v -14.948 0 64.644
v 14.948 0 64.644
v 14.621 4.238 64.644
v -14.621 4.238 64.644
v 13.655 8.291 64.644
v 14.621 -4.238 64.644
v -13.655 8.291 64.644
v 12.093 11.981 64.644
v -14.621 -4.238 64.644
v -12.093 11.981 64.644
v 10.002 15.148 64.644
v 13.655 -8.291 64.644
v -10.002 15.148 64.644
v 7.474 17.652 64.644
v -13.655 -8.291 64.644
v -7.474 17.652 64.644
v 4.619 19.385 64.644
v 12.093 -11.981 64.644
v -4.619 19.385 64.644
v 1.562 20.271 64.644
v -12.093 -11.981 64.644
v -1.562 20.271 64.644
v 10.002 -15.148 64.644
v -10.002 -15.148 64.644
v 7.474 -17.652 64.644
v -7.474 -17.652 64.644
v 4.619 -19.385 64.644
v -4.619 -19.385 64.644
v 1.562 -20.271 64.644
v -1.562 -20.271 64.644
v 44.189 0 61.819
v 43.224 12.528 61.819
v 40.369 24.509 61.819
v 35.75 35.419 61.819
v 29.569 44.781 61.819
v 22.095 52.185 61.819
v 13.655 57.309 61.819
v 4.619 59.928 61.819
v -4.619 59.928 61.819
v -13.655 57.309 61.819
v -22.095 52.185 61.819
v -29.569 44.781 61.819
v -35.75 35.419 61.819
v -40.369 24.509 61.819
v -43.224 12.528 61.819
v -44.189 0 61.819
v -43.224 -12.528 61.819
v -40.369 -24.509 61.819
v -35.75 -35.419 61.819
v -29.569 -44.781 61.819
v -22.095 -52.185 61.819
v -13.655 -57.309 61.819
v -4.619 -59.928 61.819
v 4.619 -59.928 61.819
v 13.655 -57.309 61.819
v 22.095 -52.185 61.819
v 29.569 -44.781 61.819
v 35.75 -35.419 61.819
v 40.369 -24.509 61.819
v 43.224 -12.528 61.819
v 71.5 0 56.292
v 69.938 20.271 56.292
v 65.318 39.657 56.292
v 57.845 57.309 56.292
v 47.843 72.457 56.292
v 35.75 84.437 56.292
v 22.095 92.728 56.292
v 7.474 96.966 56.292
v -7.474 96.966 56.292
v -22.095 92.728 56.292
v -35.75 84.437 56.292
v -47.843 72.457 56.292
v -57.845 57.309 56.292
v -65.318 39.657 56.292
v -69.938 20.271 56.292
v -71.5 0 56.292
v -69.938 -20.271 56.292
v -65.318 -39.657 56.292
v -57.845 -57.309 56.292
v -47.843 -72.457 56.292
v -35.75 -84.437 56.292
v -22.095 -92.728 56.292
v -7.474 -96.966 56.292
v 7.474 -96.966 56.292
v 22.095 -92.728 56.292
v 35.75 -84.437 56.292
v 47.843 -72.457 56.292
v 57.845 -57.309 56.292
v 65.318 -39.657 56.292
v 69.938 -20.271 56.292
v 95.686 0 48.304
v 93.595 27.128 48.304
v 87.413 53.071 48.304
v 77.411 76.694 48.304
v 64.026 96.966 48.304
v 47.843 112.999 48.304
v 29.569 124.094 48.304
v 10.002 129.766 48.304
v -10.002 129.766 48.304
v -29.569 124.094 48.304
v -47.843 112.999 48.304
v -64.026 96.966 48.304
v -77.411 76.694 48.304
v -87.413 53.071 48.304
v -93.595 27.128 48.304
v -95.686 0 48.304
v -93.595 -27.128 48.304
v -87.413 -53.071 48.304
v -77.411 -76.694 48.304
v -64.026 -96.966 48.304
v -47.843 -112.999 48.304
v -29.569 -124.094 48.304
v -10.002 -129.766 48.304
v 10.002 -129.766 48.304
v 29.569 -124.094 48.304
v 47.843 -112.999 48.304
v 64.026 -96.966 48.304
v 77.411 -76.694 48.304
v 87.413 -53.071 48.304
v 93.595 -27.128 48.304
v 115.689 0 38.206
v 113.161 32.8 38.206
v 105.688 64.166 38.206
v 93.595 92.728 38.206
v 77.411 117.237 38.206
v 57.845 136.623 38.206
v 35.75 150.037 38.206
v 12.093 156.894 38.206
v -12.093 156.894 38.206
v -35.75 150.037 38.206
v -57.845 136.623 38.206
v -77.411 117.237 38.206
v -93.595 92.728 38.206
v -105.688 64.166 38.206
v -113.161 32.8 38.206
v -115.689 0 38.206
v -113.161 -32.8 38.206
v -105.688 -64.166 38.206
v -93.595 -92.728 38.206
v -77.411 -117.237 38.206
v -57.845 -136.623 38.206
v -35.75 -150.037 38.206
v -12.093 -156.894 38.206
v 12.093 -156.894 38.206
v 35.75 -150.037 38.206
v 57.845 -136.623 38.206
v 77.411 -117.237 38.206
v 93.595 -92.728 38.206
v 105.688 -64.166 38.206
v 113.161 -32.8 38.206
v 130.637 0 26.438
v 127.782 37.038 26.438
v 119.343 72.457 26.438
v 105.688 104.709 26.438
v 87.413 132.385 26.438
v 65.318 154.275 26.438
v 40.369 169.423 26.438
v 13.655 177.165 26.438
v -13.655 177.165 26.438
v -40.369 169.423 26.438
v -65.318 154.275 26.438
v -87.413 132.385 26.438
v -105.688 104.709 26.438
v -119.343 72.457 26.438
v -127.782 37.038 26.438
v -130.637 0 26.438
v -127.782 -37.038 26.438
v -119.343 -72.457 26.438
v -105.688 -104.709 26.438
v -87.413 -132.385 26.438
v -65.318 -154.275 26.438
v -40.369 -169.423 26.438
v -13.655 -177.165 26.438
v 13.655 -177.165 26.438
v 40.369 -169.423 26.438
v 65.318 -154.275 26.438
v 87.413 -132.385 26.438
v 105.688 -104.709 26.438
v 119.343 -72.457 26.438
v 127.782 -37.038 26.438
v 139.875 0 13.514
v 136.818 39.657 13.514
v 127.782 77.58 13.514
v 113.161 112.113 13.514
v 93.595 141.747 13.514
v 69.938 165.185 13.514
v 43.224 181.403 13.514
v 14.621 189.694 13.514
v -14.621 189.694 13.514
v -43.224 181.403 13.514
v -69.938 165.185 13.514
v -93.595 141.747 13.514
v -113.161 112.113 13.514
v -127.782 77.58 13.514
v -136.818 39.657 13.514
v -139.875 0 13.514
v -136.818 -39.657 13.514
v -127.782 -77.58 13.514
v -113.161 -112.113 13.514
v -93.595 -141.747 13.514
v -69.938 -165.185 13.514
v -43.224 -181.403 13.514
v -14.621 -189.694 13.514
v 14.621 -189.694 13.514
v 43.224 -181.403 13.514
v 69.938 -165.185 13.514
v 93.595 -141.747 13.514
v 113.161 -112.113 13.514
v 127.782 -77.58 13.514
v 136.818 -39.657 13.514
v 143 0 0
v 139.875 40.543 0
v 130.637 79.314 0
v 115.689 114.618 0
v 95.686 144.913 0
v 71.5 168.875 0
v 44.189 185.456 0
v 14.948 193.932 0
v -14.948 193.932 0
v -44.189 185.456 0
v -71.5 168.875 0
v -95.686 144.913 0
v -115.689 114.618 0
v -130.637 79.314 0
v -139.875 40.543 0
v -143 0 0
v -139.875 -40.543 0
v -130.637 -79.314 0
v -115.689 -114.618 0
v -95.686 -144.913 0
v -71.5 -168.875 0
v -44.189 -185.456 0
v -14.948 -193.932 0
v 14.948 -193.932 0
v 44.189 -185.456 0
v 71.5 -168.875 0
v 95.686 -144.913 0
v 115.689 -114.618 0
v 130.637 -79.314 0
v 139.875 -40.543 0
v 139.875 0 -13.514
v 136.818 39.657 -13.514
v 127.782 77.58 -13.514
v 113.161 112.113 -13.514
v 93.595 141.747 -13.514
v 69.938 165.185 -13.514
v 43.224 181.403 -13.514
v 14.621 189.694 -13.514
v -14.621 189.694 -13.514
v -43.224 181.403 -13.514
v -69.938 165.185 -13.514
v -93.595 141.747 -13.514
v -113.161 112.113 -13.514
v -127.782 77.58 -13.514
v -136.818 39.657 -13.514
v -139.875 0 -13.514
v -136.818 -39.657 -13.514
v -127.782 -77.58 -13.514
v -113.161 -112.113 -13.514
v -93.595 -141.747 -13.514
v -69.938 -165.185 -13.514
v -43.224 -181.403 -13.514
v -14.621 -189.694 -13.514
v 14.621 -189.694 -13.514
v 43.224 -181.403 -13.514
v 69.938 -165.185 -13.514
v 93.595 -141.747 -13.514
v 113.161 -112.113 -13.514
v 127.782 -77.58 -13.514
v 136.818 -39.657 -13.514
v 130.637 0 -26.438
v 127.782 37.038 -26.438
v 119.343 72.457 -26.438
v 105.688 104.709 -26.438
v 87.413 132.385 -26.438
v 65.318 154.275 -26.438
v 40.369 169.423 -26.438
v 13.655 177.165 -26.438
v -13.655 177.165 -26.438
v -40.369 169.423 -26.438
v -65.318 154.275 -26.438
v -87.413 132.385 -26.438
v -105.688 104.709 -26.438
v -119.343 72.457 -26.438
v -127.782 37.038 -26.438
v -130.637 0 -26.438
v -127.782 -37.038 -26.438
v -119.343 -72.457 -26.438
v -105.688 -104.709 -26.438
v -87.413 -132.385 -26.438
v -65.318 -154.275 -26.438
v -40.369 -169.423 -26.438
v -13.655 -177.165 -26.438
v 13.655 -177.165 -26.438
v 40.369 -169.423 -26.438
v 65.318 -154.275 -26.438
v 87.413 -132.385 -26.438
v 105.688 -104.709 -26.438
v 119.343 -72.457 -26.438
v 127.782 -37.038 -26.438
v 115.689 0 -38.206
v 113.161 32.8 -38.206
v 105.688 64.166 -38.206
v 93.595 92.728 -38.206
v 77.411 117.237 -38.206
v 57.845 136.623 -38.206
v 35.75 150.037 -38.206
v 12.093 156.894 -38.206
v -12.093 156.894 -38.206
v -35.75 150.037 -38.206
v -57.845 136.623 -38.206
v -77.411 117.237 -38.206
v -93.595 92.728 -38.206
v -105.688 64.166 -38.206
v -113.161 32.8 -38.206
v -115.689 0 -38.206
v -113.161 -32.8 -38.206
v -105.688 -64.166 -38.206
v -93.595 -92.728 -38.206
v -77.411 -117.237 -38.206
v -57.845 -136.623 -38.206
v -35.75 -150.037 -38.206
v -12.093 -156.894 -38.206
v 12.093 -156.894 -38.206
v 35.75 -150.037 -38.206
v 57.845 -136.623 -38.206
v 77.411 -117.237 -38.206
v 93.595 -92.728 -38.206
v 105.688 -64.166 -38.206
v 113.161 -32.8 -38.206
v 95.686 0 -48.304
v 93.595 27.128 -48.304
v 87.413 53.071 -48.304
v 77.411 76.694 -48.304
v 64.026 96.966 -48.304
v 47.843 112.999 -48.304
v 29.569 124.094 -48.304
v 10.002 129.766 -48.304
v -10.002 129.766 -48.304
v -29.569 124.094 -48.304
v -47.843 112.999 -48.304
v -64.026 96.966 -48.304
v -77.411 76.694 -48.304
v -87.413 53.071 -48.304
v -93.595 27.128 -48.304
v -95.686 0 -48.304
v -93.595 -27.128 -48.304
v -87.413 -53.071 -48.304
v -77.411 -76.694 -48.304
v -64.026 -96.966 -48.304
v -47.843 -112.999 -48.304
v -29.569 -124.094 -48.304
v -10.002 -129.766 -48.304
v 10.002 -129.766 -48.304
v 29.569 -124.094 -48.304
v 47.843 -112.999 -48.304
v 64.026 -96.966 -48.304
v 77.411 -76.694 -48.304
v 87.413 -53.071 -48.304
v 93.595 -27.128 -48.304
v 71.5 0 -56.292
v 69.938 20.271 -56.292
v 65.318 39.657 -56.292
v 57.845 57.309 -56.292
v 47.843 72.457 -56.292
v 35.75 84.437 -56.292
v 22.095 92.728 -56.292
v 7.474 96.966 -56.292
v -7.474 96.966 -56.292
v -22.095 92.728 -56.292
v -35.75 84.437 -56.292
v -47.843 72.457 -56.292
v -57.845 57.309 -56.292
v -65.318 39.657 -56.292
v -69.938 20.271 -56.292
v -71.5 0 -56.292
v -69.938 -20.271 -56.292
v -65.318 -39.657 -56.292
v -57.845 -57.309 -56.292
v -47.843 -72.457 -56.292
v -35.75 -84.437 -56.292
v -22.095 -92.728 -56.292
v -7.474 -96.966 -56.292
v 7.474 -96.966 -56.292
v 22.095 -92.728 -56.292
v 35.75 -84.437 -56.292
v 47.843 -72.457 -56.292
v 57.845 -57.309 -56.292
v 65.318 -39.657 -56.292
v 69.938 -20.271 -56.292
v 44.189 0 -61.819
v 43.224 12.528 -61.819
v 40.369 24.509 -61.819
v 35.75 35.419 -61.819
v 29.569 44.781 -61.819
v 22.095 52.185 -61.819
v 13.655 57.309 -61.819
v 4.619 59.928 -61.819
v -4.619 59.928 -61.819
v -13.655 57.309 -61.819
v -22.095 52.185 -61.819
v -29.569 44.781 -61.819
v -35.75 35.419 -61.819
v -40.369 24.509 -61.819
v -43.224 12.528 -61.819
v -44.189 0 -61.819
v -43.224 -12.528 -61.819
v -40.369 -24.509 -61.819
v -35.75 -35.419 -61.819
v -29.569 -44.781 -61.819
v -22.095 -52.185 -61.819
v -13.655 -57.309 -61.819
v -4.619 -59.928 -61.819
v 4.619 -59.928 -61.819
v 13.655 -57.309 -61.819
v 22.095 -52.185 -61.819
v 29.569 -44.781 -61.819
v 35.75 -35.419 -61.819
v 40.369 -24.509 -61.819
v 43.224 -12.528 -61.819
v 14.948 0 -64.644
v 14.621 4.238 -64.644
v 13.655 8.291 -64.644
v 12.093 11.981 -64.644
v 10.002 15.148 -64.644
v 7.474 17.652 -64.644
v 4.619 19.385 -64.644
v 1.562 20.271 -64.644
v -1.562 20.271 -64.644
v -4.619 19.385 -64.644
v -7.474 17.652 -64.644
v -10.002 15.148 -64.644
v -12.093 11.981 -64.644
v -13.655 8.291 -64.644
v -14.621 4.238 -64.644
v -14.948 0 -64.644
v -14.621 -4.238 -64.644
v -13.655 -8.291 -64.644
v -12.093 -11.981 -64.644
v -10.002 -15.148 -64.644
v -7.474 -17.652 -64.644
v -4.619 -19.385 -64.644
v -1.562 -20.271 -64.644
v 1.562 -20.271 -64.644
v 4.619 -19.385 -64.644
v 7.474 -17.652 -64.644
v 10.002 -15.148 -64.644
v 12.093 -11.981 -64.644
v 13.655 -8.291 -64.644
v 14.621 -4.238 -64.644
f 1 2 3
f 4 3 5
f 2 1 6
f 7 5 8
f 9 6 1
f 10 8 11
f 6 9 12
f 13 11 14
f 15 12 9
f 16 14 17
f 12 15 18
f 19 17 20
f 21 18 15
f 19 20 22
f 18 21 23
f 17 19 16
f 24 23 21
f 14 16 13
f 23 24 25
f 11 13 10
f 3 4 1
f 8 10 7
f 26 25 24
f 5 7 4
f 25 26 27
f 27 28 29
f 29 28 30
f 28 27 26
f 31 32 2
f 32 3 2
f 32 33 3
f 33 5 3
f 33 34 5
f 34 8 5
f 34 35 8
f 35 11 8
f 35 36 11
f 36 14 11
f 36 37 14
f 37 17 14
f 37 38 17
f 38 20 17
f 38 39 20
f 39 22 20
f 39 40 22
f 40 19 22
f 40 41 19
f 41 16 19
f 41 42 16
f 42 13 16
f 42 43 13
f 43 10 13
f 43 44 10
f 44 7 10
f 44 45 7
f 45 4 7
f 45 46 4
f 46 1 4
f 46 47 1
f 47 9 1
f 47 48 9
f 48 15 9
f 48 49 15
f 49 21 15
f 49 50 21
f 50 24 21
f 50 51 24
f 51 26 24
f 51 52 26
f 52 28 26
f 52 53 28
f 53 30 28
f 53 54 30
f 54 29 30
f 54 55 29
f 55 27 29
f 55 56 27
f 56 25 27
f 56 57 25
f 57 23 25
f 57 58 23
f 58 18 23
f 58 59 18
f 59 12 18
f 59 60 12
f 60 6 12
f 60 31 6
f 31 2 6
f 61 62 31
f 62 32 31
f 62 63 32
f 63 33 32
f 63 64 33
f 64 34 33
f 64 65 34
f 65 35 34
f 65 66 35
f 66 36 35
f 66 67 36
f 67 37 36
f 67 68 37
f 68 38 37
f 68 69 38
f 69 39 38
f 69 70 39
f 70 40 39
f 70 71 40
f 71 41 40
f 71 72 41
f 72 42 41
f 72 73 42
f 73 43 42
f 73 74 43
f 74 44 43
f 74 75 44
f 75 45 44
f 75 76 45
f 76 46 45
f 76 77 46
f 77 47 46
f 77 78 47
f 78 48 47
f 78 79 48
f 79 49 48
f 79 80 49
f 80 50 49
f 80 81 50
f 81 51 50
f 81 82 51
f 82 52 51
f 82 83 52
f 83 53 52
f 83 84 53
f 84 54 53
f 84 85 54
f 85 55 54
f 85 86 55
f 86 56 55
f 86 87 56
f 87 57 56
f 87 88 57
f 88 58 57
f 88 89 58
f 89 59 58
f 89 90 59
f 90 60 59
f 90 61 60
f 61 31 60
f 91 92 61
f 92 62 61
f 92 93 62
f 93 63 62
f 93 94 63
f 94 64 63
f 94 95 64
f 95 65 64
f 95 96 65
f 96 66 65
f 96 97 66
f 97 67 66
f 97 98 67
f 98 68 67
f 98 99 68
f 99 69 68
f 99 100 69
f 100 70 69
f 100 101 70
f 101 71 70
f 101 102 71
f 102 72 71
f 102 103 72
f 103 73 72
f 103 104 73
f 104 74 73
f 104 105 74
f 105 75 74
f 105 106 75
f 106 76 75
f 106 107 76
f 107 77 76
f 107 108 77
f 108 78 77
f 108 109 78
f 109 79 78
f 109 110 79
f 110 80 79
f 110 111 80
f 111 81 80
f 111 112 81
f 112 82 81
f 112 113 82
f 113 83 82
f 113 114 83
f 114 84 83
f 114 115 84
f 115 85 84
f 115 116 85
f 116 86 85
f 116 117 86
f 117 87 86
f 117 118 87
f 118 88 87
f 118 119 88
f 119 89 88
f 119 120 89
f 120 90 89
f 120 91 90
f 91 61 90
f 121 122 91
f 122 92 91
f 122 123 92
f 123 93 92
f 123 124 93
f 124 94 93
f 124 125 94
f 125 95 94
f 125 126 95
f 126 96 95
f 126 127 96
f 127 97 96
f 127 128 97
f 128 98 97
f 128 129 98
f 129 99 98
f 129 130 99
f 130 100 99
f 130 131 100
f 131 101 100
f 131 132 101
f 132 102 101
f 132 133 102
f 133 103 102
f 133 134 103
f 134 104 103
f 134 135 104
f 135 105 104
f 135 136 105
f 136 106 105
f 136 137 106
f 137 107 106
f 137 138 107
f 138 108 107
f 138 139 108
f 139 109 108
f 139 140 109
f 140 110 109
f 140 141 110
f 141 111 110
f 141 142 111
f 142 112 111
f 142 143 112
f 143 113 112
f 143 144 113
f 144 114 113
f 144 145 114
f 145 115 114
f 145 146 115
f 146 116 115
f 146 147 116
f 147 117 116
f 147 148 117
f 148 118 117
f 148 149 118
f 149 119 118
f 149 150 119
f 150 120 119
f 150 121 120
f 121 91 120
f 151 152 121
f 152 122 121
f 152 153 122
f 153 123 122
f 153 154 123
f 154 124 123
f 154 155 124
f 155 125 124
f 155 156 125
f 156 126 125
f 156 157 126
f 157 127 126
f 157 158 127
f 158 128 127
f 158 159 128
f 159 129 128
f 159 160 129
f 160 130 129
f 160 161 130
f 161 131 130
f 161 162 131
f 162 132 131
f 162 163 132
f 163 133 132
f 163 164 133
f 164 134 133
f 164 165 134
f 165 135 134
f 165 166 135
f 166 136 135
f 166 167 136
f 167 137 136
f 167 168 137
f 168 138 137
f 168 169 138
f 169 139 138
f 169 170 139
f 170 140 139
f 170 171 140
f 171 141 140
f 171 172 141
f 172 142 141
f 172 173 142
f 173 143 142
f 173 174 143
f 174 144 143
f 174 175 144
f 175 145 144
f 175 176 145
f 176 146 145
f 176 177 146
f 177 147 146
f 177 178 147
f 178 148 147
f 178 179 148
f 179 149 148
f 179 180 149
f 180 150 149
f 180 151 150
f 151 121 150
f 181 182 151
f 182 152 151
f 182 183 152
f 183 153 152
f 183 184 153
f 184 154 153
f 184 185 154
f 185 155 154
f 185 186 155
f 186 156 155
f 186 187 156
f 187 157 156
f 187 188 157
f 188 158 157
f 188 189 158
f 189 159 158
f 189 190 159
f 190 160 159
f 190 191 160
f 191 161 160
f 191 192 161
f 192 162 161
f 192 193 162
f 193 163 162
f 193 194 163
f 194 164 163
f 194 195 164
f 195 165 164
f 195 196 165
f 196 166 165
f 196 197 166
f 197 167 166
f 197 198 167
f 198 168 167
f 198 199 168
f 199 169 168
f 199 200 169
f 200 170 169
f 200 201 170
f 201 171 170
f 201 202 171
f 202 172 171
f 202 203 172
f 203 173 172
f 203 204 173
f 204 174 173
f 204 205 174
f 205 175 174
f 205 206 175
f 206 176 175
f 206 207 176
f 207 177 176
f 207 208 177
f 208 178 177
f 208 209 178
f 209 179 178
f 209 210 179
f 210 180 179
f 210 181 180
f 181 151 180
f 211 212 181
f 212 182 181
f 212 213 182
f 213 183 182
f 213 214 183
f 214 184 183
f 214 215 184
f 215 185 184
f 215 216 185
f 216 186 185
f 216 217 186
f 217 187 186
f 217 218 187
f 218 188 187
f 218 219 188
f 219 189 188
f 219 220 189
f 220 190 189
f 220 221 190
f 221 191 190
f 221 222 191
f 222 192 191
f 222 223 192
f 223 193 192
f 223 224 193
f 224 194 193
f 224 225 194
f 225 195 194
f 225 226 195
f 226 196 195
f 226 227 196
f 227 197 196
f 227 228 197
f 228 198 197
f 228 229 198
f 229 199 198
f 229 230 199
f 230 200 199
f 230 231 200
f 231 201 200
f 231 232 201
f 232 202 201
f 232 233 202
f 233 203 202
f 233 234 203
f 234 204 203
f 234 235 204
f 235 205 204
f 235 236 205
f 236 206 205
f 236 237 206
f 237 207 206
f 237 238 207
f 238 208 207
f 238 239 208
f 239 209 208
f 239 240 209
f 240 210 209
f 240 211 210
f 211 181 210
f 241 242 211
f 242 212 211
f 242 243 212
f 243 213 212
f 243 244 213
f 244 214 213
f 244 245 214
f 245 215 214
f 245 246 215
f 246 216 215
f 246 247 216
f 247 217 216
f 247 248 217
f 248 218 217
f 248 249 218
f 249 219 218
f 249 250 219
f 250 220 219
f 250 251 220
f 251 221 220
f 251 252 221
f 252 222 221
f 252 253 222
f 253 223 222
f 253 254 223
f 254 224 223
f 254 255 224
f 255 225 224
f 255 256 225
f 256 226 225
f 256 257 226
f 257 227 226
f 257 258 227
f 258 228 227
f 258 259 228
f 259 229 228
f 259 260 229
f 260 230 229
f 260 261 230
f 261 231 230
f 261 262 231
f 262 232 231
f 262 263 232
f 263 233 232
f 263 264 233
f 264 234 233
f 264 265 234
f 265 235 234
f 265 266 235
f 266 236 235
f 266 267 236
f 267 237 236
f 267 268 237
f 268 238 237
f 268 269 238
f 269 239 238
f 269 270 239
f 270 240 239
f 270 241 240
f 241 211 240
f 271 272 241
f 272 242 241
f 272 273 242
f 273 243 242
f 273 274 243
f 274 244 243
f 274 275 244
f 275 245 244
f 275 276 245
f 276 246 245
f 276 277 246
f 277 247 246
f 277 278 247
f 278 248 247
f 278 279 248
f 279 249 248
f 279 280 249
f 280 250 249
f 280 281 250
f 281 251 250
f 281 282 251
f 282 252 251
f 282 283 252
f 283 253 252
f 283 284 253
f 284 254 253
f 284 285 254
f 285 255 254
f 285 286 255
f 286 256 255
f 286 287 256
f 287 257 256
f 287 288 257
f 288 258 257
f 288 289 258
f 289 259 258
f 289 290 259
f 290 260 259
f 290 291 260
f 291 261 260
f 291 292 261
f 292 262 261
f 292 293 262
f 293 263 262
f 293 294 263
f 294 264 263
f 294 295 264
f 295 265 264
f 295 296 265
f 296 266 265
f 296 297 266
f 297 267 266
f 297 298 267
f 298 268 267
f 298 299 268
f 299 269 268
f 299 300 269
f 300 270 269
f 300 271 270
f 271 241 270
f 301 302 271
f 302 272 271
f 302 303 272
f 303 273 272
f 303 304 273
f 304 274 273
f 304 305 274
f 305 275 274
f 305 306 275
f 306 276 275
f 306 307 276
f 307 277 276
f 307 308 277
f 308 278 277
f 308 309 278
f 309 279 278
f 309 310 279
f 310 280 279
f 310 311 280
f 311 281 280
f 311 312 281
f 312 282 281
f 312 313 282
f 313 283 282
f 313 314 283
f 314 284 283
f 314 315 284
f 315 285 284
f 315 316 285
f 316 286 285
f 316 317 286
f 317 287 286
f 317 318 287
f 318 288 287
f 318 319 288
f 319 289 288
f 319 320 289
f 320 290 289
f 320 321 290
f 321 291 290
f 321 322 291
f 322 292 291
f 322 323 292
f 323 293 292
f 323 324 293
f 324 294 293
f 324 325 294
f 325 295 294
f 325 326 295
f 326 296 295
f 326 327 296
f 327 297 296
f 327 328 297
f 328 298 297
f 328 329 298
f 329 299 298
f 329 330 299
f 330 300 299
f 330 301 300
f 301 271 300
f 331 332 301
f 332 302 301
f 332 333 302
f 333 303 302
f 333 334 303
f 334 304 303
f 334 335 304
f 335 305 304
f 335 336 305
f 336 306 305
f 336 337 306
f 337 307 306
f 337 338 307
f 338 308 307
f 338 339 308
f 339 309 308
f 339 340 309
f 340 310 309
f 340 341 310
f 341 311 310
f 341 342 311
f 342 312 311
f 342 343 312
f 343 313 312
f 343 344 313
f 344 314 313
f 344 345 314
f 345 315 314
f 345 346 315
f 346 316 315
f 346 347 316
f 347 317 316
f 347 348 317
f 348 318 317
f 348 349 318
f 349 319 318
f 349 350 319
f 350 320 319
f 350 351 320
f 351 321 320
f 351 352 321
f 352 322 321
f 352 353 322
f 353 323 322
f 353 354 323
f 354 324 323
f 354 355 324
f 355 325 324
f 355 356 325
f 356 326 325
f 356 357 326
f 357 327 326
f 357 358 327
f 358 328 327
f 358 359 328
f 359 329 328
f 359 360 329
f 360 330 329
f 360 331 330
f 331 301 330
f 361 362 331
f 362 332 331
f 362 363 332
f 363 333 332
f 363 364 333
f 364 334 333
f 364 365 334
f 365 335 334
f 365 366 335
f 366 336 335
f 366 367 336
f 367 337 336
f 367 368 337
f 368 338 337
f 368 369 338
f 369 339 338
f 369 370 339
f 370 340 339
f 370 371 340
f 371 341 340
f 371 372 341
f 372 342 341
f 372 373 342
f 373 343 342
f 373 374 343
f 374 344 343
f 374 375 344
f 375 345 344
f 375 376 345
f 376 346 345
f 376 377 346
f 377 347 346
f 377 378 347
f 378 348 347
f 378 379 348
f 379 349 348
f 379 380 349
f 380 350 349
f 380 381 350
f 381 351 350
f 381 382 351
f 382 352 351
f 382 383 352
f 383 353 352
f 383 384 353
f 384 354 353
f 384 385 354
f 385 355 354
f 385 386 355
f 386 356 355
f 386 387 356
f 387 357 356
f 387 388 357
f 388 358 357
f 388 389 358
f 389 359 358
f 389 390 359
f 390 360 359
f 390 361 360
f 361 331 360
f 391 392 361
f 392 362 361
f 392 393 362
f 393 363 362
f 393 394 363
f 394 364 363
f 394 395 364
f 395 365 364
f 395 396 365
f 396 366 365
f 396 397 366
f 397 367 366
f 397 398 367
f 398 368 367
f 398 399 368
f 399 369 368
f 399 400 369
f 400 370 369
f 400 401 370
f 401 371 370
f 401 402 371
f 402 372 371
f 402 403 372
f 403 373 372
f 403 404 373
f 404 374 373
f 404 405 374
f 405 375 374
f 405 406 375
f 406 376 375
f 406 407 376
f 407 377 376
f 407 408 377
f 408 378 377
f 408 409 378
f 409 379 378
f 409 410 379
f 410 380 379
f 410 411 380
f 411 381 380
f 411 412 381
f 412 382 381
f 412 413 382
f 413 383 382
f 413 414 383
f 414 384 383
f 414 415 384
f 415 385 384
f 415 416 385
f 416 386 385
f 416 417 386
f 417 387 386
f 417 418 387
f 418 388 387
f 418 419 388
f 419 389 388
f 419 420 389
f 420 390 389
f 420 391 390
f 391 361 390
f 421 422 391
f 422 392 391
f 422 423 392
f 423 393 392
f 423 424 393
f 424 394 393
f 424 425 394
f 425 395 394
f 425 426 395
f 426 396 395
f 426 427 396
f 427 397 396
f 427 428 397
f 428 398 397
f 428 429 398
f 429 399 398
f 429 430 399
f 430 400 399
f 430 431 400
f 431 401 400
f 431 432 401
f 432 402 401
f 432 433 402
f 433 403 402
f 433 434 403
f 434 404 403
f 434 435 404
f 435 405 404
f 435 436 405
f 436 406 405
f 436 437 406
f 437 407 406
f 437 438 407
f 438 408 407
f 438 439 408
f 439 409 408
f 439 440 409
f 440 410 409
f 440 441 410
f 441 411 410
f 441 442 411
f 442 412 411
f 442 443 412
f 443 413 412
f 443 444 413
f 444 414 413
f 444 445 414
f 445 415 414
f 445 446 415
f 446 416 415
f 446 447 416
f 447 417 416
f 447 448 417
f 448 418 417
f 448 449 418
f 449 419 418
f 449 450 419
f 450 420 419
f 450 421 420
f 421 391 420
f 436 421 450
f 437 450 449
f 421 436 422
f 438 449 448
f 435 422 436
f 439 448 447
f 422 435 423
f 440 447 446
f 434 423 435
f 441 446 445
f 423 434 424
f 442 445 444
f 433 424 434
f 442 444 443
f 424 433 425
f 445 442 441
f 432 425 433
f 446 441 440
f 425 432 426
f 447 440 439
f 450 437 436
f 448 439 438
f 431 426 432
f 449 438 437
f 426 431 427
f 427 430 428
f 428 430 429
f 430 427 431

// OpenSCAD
// Generated by SolidPython 1.0.1 on 2020-07-29 00:46:50


scale(v = [11, 15, 5]) {
	sphere(r = 13);
}
/***********************************************
*********      SolidPython code:      **********
************************************************
 
# import packages: SolidPython
from solid import *
from solid.utils import *
from itertools import chain, combinations, permutations


class Resize:

    def __init__(self, scad_file):
        self.scad_file = scad_file
        #self.scad_file = import_scad(scad_file)
        # cone/cylinder param:
        self.r1 = 0
        self.r2 = 0
        self.h = 0
        # rectangular prism param:
        self.w = 0
        self.l = 0
        # ellipse param:
        self.r = 0

    # import OpenScad code (file name corresponds to shape)


    # classify shape + parameters
    def assign(self, param1, param2, param3):
        if self.scad_file == 'cone.scad':
            self.r1 = param1
            self.r2 = param2
            self.h = param3
        elif self.scad_file == 'cylinder.scad':
            self.r1 = param1
            self.r2 = param2
            self.h = param3
        elif self.scad_file == 'rectangularPrism.scad':
            self.h = param1
            self.l = param2
            self.w = param3
        else:
            self.r = param1
            self.h = param2

    # resize parameters
    def iterate(self):
        x = range(3, 20, 2)
        i = 1
        if self.scad_file == 'cone.scad':
            tempList = list(permutations(x, 2))
            for temp in tempList:
                param1 = temp[0]
                param2 = temp[1]
                filepath = 'produced_scad_files/' + 'cone' + str(param1) + '_' + str(param2) + '_' + '.scad'
                scad_render_to_file(cylinder(h=param1, r1=param2, r2=0), filepath)

        elif self.scad_file == 'cylinder.scad':
            tempList = list(permutations(x, 3))
            for temp in tempList:
                param1 = temp[0]
                param2 = temp[1]
                filepath = 'produced_scad_files/' + 'cylinder' + str(param1) + '_' + str(param2) + '_' + '.scad'
                scad_render_to_file(cylinder(h=param1, r1=param2, r2=param2), filepath)

        elif self.scad_file == 'rectangularPrism.scad':
            tempList = list(permutations(x, 3))
            for temp in tempList:
                param1 = temp[0]
                param2 = temp[1]
                param3 = temp[2]
                filepath = 'produced_scad_files/' + 'rectangularPrism' + str(param1) + '_' + str(param2) + '_' + str(
                    param3) + '.scad'
                scad_render_to_file(cube(size=(param1, param2, param3)), filepath)

        elif self.scad_file == 'ellipse.scad':
            tempList = list(permutations(x, 4))
            for temp in tempList:
                param1 = temp[0]
                param2 = temp[1]
                param3 = temp[2]
                param4 = temp[3]
                filepath = 'produced_scad_files/' + 'ellipse' + str(param1) + '_' + str(param2) + '_' + str(param3) + '_' + str(param4) + '.scad'
                scad_render_to_file(scale([param1, param2, param3])(sphere(r=param4)), filepath)

    def render_to_scadfile(self):
        scad_render_to_file(scad, 'example.scad') 
 
************************************************/
